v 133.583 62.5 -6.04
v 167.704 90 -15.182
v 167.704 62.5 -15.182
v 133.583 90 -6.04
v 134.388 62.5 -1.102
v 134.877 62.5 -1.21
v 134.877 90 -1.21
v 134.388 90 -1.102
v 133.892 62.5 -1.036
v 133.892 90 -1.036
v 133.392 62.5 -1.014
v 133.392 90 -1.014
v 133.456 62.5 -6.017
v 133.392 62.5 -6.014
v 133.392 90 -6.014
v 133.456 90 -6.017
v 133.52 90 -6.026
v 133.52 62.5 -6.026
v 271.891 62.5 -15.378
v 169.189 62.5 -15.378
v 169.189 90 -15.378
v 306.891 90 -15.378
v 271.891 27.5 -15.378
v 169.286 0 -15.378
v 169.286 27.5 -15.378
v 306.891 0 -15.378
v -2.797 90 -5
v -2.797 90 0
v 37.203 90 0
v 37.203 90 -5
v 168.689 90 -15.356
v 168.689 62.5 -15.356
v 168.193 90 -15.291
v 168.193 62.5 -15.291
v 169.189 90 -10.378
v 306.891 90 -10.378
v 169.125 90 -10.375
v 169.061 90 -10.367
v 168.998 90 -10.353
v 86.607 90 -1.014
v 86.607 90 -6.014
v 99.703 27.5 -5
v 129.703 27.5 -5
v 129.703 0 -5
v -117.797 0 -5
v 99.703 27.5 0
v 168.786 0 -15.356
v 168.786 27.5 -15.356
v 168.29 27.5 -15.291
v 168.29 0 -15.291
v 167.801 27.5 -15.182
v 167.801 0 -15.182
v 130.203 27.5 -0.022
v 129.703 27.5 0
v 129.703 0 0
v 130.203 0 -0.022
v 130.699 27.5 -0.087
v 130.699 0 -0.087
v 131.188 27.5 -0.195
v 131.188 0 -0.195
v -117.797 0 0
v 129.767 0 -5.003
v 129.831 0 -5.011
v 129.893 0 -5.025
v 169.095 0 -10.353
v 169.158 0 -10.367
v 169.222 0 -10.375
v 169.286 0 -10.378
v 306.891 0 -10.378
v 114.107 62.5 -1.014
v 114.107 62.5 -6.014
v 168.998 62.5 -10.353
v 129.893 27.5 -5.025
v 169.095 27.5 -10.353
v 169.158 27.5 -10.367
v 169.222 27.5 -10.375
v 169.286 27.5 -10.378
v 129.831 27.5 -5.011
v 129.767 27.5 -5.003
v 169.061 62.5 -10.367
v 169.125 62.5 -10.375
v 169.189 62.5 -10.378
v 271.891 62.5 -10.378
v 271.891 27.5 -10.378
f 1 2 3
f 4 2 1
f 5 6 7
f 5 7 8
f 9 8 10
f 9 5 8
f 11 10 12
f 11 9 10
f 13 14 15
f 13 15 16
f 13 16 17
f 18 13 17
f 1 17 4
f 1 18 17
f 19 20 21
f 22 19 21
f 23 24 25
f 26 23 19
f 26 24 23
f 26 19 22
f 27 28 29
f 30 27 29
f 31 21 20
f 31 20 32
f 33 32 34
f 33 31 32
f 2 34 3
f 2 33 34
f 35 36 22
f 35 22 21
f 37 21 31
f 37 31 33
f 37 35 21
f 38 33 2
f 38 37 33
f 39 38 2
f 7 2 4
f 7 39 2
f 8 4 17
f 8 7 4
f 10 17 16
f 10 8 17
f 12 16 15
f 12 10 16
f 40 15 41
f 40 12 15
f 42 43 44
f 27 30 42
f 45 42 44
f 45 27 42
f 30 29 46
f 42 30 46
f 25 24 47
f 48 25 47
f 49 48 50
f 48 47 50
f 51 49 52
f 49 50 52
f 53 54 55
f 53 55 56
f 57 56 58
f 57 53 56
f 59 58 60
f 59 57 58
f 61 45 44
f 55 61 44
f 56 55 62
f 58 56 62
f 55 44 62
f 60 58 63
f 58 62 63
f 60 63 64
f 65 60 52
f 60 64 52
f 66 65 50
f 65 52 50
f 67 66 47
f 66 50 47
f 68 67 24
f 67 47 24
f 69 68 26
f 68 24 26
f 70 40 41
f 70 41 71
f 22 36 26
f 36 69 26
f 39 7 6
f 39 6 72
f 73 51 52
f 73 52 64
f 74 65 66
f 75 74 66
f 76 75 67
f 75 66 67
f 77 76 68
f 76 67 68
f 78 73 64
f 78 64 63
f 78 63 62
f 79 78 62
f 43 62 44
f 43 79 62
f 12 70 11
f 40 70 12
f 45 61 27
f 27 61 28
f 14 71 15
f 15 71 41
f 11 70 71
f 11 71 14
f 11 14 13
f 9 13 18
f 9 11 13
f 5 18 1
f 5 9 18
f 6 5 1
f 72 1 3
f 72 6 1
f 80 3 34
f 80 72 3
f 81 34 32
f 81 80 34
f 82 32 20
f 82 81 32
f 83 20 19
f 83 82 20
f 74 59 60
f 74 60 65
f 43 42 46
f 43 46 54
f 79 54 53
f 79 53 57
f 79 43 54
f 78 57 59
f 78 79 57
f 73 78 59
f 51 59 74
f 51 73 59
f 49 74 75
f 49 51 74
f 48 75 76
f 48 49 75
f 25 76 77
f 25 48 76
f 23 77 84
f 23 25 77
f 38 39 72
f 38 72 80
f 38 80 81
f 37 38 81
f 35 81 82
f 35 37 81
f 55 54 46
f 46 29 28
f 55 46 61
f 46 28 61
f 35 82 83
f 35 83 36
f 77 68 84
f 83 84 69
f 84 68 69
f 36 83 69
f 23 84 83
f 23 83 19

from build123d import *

# Parameters (mm, degrees)
BASE_FLANGE1_DEPTH       = 5
EDGE_FLANGE1_DEPTH       = 27.5
EDGE_FLANGE2_DEPTH       = 27.5
EDGE_FLANGE2_START       = 62.5
EDGE_FLANGE2_2_OUTLINE_W = 137.70274344
EDGE_FLANGE2_2_OUTLINE_H = 5
EDGE_FLANGE2_2_DEPTH     = 27.5
EDGE_FLANGE2_START_2     = 27.5
EDGE_FLANGE2_3_OUTLINE_W = 35
EDGE_FLANGE2_3_OUTLINE_H = 5
EDGE_FLANGE2_3_DEPTH     = 35
EDGE_FLANGE3_DEPTH       = 27.5
EDGE_FLANGE4_DEPTH       = 27.5
EDGE_FLANGE4_START       = 5
EDGE_FLANGE4_FLAT_DEPTH  = 5


# Read off the part's stored shape, not the designer's step: Edge-Flange2
# Sheet-metal steps are written as plain solids
with BuildPart() as part:
    # Sketch1 → Base-Flange1 (new body)
    with BuildSketch(Plane.XY):
        Polygon((0, 0), (-117.7971995, 0), (-2.7971995, 90), (37.2028005, 90), (99.7028005, 27.5), (129.7028005, 27.5), (129.7028005, 0), align=None)
    extrude(amount=-BASE_FLANGE1_DEPTH)

    # Edge-Flange1 section (across the edge) → Edge-Flange1 (add)
    with BuildSketch(Plane(origin=(129.79977573, 27.5, -5), x_dir=(-0.2588190451025146, 0, -0.96592582628907), z_dir=(0, -1, 0))):
        with BuildLine():
            Line((-5, 0.09697523), (-5, 39.341737512))
            Line((-5, 39.341737512), (0, 39.341737512))
            Line((0, 39.341737512), (0, 0.09697523))
            ThreePointArc((0, 0.09697523), (0.006301715, 0.000829637), (0.025099036, -0.093670879))
            Line((0.025099036, -0.093670879), (-4.804530095, -1.387766104))
            ThreePointArc((-4.804530095, -1.387766104), (-4.950922592, -0.651801325), (-5, 0.09697523))
        make_face()
    extrude(amount=EDGE_FLANGE1_DEPTH)

    # Edge-Flange2 outline → Edge-Flange2 (add)
    with BuildSketch(Plane(origin=(0, 0, 0), x_dir=(1, 0, 0), z_dir=(0, 1, 0))):
        with BuildLine():
            ThreePointArc((169.285717378, 15.37786084), (168.536940824, 15.328783432), (167.800976044, 15.182390936))
            Line((167.800976044, 15.182390936), (169.09507127, 10.352761804))
            ThreePointArc((169.09507127, 10.352761804), (169.189571785, 10.371559125), (169.285717378, 10.37786084))
            Line((169.285717378, 10.37786084), (306.891485589, 10.37786084))
            Line((306.891485589, 10.37786084), (306.891485589, 15.37786084))
            Line((306.891485589, 15.37786084), (169.285717378, 15.37786084))
        make_face()
    extrude(amount=EDGE_FLANGE2_DEPTH)



with BuildPart() as body_2:
    # Edge-Flange2 2 outline → Edge-Flange2 2 (new body)
    with BuildSketch(Plane(origin=(0, 0, 0), x_dir=(1, 0, 0), z_dir=(0, 1, 0)).offset(EDGE_FLANGE2_START)):
        with Locations((238.040113869, 12.87786084)):
            Rectangle(EDGE_FLANGE2_2_OUTLINE_W, EDGE_FLANGE2_2_OUTLINE_H)
    extrude(amount=EDGE_FLANGE2_2_DEPTH)


with BuildPart() as part_1:
    add(part.part)

    add(body_2.part)  # Edge-Flange2 3 merges body 2
    # Edge-Flange2 3 outline → Edge-Flange2 3 (add)
    with BuildSketch(Plane(origin=(0, 0, 0), x_dir=(1, 0, 0), z_dir=(0, 1, 0)).offset(EDGE_FLANGE2_START_2)):
        with Locations((289.391485589, 12.87786084)):
            Rectangle(EDGE_FLANGE2_3_OUTLINE_W, EDGE_FLANGE2_3_OUTLINE_H)
    extrude(amount=EDGE_FLANGE2_3_DEPTH)

    # Edge-Flange3 section (across the edge) → Edge-Flange3 (add)
    with BuildSketch(Plane(origin=(169.091766919, 90, -10.37786084), x_dir=(0.2588190451025146, 0, 0.96592582628907), z_dir=(0, -1, 0))):
        with BuildLine():
            Line((-5, 0.09697523), (-5, 35.422092475))
            Line((-5, 35.422092475), (0, 35.422092475))
            Line((0, 35.422092475), (0, 0.09697523))
            ThreePointArc((0, 0.09697523), (0.006301715, 0.000829637), (0.025099036, -0.093670879))
            Line((0.025099036, -0.093670879), (-4.804530095, -1.387766104))
            ThreePointArc((-4.804530095, -1.387766104), (-4.950922592, -0.651801325), (-5, 0.09697523))
        make_face()
    extrude(amount=EDGE_FLANGE3_DEPTH)

    # Edge-Flange4 bend section (across the edge) → Edge-Flange4 (add)
    with BuildSketch(Plane(origin=(133.488886871, 62.5, -6.014478786), x_dir=(0, 0, -1), z_dir=(0, 1, 0))):
        with BuildLine():
            Line((-5, 0.09697523), (0, 0.09697523))
            ThreePointArc((0, 0.09697523), (0.006301715, 0.000829637), (0.025099036, -0.093670879))
            Line((0.025099036, -0.093670879), (-4.804530095, -1.387766104))
            ThreePointArc((-4.804530095, -1.387766104), (-4.950922592, -0.651801325), (-5, 0.09697523))
        make_face()
    extrude(amount=EDGE_FLANGE4_DEPTH)

    # Edge-Flange4 profile (on flange) → Edge-Flange4 flat (add)
    with BuildSketch(Plane(origin=(133.488886871, 0, -6.014478786), x_dir=(0, 1, 0), z_dir=(0, 0, 1)).offset(EDGE_FLANGE4_START)):
        Polygon((62.5, 19.382282567), (62.5, 0.09697523), (90, 0.09697523), (90, 46.882282567), align=None)
    extrude(amount=-EDGE_FLANGE4_FLAT_DEPTH)


solid = part_1.part
